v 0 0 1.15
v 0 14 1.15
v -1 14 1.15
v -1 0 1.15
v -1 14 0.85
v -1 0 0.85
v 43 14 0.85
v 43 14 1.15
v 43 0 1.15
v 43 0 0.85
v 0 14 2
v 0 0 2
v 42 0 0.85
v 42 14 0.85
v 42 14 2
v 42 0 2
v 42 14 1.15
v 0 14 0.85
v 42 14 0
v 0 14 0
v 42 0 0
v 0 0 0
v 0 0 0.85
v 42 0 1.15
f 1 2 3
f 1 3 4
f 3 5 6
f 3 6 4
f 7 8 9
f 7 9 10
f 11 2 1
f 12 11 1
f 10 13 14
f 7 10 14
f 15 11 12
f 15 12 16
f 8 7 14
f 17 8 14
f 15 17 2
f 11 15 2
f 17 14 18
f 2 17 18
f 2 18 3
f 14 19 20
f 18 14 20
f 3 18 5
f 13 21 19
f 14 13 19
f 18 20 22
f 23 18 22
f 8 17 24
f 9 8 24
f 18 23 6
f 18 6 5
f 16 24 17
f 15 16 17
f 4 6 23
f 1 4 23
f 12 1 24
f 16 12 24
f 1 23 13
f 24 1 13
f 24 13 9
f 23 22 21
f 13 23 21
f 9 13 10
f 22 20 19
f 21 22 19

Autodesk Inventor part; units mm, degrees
ref_plane "YZ Plane" through (0, 0, 0) normal (1, 0, 0) x (0, 1, 0)
ref_plane "XZ Plane" through (0, 0, 0) normal (0, 1, 0) x (-1, 0, 0)
ref_plane "XY Plane" through (0, 0, 0) normal (0, 0, 1) x (1, 0, 0)
sketch "Sketch1" plane through (0, 0, 0) normal (0, 0, 1) x (1, 0, 0)
  line L0 (0, 0) -> (42, 0)
  line L1 (42, 0) -> (42, 14)
  line L2 (42, 14) -> (0, 14)
  line L3 (0, 14) -> (0, 0)
  dimension "d0" = 42
  dimension "d1" = 14
extrude "Extrusion1" add sketch "Sketch1" along normal blind 2
sketch "Sketch2" plane through (42, 0, 0) normal (1, 0, 0) x (0, 0, -1)
  line L0 (0, 14) -> (-2, 14) projected
  line L1 (-2, 0) -> (-2, 14) projected
  line L2 (0, 0) -> (-2, 0) projected
  line L3 (-1.15, 0) -> (-0.85, 0)
  line L4 (-0.85, 0) -> (-0.85, 14)
  line L5 (-0.85, 14) -> (-1.15, 14)
  line L6 (-1.15, 14) -> (-1.15, 0)
  dimension "d4" = 0.85
  dimension "d5" = 0.3
extrude "Extrusion2" add sketch "Sketch2" along normal blind 1 contours L4 L2 L6 L0
sketch "Sketch3" plane through (0, 0, 0) normal (-1, 0, 0) x (0, 0, 1)
  line L0 (0.85, 14) -> (1.15, 14) projected
  line L1 (1.15, 14) -> (1.15, 0) projected
  line L2 (0.85, 14) -> (1.15, 14)
  line L3 (1.15, 14) -> (1.15, 0)
  line L4 (1.15, 0) -> (0.85, 0)
  line L5 (0.85, 0) -> (0.85, 14)
extrude "Extrusion3" add sketch "Sketch3" along normal blind 1
properties part number "Voorplaat"
